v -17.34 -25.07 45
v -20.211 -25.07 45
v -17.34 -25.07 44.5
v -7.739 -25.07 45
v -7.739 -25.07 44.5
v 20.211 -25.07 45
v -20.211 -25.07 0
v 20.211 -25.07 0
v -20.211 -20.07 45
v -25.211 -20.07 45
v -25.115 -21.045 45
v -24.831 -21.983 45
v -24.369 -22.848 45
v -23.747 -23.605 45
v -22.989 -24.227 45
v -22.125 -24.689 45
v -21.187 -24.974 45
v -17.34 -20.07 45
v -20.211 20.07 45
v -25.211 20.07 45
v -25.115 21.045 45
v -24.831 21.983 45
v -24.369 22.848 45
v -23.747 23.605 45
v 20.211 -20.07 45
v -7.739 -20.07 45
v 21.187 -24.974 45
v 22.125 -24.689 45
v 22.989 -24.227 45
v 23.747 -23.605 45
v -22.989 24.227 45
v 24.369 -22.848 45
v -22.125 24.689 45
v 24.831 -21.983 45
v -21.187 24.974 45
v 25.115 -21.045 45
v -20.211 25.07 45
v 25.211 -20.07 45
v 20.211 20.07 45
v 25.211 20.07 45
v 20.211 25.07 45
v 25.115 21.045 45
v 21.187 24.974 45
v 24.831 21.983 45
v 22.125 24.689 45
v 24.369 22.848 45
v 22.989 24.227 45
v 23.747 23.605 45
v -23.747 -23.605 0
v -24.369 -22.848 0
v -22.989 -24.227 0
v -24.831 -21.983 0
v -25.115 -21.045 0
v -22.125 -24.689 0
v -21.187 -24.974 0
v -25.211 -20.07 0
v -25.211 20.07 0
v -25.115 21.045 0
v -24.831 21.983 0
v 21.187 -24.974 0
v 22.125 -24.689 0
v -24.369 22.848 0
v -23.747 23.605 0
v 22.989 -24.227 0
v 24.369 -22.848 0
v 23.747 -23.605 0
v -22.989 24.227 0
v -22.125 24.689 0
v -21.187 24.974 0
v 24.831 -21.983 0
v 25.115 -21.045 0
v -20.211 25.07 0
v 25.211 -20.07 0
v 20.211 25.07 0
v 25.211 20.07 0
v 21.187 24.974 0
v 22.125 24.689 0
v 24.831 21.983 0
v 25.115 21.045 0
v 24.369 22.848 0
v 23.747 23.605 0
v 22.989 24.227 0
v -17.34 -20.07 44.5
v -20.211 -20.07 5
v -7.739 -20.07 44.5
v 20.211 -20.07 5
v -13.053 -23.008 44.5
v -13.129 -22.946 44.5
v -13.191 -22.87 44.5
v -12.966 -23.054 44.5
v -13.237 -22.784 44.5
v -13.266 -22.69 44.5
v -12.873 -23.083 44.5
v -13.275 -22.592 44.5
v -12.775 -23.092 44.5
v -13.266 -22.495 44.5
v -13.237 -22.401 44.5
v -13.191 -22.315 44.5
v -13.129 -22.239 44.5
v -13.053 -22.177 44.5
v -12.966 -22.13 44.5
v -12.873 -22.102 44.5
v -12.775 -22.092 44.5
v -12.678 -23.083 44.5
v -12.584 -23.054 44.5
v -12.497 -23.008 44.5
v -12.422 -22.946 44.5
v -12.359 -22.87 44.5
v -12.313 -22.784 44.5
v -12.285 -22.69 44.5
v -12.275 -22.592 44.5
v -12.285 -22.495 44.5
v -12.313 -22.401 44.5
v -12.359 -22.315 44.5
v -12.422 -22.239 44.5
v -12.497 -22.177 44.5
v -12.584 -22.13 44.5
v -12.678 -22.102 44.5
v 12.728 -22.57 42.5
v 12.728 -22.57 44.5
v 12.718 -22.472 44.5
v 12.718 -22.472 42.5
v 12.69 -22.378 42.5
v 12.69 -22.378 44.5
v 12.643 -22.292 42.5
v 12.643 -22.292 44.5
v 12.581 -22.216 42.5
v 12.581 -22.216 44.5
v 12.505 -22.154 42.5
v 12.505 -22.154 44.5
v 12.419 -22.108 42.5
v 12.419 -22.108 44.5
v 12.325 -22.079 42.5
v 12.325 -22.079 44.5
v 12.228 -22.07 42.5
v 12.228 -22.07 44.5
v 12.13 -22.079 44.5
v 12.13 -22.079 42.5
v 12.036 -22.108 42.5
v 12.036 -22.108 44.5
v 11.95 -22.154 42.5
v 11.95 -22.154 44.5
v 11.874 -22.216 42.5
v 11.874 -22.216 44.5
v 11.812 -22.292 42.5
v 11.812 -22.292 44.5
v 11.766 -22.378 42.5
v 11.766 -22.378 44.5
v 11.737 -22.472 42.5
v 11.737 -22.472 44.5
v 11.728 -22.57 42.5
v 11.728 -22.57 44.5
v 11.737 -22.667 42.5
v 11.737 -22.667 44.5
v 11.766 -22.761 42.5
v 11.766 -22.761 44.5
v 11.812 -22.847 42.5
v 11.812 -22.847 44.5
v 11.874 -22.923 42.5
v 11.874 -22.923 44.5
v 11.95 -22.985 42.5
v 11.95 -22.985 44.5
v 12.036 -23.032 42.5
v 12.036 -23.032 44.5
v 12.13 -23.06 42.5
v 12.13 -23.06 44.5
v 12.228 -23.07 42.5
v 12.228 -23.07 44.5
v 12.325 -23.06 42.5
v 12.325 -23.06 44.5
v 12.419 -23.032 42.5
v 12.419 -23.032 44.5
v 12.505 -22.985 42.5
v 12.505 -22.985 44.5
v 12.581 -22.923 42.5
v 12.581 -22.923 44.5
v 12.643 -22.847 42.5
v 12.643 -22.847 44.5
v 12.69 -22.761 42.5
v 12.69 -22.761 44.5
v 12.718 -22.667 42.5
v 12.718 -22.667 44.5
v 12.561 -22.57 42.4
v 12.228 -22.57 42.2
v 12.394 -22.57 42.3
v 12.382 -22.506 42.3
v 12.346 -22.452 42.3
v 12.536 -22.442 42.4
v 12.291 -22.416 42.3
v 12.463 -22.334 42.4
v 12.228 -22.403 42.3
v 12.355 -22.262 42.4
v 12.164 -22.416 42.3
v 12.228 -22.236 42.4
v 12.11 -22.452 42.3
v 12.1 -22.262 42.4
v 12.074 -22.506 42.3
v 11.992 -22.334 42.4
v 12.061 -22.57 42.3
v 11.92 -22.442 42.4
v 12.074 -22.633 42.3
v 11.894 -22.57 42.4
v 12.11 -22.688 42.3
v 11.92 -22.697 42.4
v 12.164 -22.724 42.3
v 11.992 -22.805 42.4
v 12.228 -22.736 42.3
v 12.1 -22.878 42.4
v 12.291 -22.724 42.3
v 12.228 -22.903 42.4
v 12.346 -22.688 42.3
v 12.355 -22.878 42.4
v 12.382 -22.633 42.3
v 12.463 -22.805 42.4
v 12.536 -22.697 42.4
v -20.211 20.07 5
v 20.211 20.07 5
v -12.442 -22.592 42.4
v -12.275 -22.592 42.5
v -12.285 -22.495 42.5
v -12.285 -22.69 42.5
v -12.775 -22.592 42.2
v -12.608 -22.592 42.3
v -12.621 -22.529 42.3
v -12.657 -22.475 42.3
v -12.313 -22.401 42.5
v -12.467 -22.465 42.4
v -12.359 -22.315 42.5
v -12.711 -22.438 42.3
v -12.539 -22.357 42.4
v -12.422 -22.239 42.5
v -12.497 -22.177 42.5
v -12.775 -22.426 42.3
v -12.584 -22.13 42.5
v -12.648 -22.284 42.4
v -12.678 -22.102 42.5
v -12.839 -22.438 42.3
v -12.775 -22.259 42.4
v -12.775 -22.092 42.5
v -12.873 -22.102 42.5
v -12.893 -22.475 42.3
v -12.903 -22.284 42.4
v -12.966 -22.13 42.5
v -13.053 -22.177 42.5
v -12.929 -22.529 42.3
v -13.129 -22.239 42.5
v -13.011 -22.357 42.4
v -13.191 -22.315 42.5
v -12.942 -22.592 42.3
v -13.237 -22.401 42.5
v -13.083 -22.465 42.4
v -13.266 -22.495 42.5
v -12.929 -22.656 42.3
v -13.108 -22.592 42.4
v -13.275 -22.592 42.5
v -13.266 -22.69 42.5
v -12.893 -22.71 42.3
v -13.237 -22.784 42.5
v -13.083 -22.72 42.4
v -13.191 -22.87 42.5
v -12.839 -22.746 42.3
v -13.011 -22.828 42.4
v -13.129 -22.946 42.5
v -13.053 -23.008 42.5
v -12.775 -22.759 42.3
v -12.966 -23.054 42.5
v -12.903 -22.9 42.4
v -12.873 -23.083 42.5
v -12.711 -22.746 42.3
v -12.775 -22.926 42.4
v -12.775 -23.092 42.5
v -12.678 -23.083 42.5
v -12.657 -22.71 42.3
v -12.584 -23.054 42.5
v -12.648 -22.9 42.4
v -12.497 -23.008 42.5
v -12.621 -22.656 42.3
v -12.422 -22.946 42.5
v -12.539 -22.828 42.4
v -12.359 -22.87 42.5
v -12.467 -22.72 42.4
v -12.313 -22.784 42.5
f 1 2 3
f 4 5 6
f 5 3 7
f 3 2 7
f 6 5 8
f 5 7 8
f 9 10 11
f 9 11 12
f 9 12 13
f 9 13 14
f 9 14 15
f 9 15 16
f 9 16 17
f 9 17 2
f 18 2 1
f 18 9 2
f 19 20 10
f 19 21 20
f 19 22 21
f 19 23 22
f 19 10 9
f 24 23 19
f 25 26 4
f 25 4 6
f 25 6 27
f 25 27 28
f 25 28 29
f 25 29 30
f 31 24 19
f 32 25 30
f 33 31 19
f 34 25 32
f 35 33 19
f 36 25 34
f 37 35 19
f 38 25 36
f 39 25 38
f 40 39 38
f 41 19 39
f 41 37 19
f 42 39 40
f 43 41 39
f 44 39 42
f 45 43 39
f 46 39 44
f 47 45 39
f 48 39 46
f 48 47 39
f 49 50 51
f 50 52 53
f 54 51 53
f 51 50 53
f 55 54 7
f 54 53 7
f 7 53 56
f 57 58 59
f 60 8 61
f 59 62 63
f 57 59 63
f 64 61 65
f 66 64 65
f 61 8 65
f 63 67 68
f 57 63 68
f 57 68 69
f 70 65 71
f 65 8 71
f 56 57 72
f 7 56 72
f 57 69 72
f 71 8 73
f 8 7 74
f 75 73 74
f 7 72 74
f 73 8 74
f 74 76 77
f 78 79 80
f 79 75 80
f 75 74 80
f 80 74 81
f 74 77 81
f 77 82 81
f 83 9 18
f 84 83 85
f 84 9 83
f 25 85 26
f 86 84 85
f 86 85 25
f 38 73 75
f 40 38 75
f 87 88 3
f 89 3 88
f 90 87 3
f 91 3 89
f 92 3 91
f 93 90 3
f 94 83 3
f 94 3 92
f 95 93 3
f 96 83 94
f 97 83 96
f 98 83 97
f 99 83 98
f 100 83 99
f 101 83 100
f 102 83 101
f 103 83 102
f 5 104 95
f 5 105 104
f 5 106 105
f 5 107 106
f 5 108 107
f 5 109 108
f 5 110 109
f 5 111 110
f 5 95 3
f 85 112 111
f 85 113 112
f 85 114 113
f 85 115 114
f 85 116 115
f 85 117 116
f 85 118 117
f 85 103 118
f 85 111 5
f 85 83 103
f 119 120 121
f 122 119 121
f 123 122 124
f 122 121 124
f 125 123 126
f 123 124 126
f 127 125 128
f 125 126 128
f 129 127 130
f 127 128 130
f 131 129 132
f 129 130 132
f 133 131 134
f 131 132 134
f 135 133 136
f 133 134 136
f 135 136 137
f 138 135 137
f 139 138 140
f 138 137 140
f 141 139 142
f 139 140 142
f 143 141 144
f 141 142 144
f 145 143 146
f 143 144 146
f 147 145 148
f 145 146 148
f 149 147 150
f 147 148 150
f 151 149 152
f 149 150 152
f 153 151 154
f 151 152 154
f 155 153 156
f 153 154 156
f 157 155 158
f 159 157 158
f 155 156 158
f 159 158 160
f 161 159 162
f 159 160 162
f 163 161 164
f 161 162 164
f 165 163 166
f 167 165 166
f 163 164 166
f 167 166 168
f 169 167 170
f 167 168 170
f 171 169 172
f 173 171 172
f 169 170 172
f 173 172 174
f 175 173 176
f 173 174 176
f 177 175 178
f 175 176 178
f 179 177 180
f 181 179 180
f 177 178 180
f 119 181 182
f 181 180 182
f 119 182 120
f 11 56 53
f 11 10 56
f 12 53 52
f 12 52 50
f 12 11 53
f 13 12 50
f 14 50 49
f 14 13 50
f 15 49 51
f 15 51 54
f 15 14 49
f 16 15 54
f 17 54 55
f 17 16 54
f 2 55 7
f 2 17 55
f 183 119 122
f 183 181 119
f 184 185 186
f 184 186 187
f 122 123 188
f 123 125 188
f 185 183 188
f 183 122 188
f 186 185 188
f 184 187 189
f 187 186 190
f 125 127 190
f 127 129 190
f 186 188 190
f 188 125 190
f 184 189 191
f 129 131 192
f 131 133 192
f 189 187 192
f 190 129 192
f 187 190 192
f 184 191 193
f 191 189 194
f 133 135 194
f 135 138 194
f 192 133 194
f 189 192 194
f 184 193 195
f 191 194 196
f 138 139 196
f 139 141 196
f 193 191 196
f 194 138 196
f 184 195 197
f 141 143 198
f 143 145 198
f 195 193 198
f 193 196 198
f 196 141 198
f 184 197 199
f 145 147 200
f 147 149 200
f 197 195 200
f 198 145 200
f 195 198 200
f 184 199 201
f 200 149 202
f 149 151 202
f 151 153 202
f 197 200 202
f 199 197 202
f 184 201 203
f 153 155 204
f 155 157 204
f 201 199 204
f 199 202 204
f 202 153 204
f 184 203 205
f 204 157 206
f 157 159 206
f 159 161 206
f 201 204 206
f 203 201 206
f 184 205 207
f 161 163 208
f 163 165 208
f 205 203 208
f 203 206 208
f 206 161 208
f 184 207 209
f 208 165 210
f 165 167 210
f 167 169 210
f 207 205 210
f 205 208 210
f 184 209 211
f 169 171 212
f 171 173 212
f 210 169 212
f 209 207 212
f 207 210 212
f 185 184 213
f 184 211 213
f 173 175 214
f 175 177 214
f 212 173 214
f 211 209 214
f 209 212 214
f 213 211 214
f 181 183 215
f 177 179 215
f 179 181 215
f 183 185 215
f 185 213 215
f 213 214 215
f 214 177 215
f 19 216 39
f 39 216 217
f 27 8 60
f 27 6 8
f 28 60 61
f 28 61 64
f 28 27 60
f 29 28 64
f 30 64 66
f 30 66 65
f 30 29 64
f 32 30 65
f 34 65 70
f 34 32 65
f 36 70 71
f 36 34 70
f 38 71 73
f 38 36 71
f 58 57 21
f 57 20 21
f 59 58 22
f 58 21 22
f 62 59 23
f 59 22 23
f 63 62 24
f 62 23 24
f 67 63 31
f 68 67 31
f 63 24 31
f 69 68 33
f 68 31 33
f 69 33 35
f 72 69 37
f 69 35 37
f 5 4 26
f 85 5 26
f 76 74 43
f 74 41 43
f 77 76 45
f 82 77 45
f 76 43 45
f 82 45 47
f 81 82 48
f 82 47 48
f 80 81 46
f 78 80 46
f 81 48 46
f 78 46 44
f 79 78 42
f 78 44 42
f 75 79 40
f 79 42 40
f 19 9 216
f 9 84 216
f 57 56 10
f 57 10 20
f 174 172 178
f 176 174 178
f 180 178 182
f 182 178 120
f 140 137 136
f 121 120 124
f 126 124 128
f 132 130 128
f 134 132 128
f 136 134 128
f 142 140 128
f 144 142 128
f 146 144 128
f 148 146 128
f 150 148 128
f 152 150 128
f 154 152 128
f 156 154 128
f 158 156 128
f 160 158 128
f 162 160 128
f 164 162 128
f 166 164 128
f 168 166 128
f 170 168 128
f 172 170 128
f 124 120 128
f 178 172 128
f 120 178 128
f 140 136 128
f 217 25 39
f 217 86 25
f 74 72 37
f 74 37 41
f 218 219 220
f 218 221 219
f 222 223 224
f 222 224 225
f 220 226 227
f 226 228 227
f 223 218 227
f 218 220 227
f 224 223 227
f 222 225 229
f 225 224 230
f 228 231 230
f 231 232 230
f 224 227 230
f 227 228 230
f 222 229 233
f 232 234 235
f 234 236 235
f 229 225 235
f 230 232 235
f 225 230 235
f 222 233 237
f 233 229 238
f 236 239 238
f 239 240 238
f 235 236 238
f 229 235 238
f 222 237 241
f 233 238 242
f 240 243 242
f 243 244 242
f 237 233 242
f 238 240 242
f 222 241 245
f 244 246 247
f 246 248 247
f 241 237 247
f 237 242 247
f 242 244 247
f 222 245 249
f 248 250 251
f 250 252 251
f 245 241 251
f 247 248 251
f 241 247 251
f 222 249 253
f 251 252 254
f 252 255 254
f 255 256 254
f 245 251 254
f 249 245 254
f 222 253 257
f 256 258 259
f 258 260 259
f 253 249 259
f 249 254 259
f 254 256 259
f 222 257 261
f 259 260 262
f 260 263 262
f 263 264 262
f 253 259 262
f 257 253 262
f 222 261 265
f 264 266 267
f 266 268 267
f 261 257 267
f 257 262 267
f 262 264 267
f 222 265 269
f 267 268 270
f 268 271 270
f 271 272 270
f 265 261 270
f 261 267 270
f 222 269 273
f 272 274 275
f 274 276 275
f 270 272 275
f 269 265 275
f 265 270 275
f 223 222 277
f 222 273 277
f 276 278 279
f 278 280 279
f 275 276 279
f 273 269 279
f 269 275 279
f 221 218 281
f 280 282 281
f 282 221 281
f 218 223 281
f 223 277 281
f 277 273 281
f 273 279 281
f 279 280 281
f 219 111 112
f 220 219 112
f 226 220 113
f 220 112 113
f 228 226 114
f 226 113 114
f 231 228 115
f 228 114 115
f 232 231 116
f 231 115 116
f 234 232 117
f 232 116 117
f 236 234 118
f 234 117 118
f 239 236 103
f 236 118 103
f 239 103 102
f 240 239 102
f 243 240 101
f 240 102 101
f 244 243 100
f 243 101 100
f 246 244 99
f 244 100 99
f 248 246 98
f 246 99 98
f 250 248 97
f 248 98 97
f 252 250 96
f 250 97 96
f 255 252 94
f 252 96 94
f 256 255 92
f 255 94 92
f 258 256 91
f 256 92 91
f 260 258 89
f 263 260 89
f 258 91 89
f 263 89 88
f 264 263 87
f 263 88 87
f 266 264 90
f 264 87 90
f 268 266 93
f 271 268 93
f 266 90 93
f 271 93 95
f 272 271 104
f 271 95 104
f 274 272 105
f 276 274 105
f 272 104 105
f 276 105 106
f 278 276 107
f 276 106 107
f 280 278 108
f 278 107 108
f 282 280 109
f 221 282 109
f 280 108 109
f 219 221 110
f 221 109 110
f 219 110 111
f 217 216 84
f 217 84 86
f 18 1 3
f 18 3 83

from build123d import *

# Parameters (mm, degrees)
F0_W     = 50.4226610065
F0_H     = 50.1393936574
F1_DEPTH = 45
F2_T     = -5
F3_W     = 9.6008158289
F3_H     = 5
F4_DEPTH = 0.5
F6_D     = 1
F6_DEPTH = 2
F6_TIP   = 0.3004303095
F7_R     = 5


with BuildPart() as f1:
    # F0 (on Top) → F1 (new body)
    with BuildSketch(Plane.XY):
        Rectangle(F0_W, F0_H)
    extrude(amount=F1_DEPTH)

    # F2
    f2_openings = [f1.faces().sort_by_distance(p)[0] for p in [
        (0, 0, 45),
    ]]
    offset(amount=F2_T, openings=f2_openings)

    # F3 (on face) → F4 (cut)
    with BuildSketch(Plane.XY.offset(45)):
        with Locations((-12.5397194643, -22.5696968287)):
            Rectangle(F3_W, F3_H)
    extrude(amount=-F4_DEPTH, mode=Mode.SUBTRACT)

    # F6 (one way)
    with BuildSketch(Plane.XY.offset(44.5)):
        with Locations((-12.7751557156, -22.5923974067), (12.2276665643, -22.5696968287)):
            Circle(F6_D / 2)
    extrude(amount=-F6_DEPTH, mode=Mode.SUBTRACT)
    with Locations(Plane.XY.offset(44.5)):
        with Locations((-12.7751557156, -22.5923974067), (12.2276665643, -22.5696968287)):
            with Locations((0, 0, -(F6_DEPTH + F6_TIP / 2))):  # 118° drill point
                Cone(0, F6_D / 2, F6_TIP, mode=Mode.SUBTRACT)

    # F7
    f7_edges = [f1.edges().sort_by_distance(p)[0] for p in [
        (25.211331, -25.069697, 22.5),
        (-25.211331, -25.069697, 22.5),
        (-25.211331, 25.069697, 22.5),
        (25.211331, 25.069697, 22.5),
    ]]
    fillet(f7_edges, radius=F7_R)


solid = f1.part
